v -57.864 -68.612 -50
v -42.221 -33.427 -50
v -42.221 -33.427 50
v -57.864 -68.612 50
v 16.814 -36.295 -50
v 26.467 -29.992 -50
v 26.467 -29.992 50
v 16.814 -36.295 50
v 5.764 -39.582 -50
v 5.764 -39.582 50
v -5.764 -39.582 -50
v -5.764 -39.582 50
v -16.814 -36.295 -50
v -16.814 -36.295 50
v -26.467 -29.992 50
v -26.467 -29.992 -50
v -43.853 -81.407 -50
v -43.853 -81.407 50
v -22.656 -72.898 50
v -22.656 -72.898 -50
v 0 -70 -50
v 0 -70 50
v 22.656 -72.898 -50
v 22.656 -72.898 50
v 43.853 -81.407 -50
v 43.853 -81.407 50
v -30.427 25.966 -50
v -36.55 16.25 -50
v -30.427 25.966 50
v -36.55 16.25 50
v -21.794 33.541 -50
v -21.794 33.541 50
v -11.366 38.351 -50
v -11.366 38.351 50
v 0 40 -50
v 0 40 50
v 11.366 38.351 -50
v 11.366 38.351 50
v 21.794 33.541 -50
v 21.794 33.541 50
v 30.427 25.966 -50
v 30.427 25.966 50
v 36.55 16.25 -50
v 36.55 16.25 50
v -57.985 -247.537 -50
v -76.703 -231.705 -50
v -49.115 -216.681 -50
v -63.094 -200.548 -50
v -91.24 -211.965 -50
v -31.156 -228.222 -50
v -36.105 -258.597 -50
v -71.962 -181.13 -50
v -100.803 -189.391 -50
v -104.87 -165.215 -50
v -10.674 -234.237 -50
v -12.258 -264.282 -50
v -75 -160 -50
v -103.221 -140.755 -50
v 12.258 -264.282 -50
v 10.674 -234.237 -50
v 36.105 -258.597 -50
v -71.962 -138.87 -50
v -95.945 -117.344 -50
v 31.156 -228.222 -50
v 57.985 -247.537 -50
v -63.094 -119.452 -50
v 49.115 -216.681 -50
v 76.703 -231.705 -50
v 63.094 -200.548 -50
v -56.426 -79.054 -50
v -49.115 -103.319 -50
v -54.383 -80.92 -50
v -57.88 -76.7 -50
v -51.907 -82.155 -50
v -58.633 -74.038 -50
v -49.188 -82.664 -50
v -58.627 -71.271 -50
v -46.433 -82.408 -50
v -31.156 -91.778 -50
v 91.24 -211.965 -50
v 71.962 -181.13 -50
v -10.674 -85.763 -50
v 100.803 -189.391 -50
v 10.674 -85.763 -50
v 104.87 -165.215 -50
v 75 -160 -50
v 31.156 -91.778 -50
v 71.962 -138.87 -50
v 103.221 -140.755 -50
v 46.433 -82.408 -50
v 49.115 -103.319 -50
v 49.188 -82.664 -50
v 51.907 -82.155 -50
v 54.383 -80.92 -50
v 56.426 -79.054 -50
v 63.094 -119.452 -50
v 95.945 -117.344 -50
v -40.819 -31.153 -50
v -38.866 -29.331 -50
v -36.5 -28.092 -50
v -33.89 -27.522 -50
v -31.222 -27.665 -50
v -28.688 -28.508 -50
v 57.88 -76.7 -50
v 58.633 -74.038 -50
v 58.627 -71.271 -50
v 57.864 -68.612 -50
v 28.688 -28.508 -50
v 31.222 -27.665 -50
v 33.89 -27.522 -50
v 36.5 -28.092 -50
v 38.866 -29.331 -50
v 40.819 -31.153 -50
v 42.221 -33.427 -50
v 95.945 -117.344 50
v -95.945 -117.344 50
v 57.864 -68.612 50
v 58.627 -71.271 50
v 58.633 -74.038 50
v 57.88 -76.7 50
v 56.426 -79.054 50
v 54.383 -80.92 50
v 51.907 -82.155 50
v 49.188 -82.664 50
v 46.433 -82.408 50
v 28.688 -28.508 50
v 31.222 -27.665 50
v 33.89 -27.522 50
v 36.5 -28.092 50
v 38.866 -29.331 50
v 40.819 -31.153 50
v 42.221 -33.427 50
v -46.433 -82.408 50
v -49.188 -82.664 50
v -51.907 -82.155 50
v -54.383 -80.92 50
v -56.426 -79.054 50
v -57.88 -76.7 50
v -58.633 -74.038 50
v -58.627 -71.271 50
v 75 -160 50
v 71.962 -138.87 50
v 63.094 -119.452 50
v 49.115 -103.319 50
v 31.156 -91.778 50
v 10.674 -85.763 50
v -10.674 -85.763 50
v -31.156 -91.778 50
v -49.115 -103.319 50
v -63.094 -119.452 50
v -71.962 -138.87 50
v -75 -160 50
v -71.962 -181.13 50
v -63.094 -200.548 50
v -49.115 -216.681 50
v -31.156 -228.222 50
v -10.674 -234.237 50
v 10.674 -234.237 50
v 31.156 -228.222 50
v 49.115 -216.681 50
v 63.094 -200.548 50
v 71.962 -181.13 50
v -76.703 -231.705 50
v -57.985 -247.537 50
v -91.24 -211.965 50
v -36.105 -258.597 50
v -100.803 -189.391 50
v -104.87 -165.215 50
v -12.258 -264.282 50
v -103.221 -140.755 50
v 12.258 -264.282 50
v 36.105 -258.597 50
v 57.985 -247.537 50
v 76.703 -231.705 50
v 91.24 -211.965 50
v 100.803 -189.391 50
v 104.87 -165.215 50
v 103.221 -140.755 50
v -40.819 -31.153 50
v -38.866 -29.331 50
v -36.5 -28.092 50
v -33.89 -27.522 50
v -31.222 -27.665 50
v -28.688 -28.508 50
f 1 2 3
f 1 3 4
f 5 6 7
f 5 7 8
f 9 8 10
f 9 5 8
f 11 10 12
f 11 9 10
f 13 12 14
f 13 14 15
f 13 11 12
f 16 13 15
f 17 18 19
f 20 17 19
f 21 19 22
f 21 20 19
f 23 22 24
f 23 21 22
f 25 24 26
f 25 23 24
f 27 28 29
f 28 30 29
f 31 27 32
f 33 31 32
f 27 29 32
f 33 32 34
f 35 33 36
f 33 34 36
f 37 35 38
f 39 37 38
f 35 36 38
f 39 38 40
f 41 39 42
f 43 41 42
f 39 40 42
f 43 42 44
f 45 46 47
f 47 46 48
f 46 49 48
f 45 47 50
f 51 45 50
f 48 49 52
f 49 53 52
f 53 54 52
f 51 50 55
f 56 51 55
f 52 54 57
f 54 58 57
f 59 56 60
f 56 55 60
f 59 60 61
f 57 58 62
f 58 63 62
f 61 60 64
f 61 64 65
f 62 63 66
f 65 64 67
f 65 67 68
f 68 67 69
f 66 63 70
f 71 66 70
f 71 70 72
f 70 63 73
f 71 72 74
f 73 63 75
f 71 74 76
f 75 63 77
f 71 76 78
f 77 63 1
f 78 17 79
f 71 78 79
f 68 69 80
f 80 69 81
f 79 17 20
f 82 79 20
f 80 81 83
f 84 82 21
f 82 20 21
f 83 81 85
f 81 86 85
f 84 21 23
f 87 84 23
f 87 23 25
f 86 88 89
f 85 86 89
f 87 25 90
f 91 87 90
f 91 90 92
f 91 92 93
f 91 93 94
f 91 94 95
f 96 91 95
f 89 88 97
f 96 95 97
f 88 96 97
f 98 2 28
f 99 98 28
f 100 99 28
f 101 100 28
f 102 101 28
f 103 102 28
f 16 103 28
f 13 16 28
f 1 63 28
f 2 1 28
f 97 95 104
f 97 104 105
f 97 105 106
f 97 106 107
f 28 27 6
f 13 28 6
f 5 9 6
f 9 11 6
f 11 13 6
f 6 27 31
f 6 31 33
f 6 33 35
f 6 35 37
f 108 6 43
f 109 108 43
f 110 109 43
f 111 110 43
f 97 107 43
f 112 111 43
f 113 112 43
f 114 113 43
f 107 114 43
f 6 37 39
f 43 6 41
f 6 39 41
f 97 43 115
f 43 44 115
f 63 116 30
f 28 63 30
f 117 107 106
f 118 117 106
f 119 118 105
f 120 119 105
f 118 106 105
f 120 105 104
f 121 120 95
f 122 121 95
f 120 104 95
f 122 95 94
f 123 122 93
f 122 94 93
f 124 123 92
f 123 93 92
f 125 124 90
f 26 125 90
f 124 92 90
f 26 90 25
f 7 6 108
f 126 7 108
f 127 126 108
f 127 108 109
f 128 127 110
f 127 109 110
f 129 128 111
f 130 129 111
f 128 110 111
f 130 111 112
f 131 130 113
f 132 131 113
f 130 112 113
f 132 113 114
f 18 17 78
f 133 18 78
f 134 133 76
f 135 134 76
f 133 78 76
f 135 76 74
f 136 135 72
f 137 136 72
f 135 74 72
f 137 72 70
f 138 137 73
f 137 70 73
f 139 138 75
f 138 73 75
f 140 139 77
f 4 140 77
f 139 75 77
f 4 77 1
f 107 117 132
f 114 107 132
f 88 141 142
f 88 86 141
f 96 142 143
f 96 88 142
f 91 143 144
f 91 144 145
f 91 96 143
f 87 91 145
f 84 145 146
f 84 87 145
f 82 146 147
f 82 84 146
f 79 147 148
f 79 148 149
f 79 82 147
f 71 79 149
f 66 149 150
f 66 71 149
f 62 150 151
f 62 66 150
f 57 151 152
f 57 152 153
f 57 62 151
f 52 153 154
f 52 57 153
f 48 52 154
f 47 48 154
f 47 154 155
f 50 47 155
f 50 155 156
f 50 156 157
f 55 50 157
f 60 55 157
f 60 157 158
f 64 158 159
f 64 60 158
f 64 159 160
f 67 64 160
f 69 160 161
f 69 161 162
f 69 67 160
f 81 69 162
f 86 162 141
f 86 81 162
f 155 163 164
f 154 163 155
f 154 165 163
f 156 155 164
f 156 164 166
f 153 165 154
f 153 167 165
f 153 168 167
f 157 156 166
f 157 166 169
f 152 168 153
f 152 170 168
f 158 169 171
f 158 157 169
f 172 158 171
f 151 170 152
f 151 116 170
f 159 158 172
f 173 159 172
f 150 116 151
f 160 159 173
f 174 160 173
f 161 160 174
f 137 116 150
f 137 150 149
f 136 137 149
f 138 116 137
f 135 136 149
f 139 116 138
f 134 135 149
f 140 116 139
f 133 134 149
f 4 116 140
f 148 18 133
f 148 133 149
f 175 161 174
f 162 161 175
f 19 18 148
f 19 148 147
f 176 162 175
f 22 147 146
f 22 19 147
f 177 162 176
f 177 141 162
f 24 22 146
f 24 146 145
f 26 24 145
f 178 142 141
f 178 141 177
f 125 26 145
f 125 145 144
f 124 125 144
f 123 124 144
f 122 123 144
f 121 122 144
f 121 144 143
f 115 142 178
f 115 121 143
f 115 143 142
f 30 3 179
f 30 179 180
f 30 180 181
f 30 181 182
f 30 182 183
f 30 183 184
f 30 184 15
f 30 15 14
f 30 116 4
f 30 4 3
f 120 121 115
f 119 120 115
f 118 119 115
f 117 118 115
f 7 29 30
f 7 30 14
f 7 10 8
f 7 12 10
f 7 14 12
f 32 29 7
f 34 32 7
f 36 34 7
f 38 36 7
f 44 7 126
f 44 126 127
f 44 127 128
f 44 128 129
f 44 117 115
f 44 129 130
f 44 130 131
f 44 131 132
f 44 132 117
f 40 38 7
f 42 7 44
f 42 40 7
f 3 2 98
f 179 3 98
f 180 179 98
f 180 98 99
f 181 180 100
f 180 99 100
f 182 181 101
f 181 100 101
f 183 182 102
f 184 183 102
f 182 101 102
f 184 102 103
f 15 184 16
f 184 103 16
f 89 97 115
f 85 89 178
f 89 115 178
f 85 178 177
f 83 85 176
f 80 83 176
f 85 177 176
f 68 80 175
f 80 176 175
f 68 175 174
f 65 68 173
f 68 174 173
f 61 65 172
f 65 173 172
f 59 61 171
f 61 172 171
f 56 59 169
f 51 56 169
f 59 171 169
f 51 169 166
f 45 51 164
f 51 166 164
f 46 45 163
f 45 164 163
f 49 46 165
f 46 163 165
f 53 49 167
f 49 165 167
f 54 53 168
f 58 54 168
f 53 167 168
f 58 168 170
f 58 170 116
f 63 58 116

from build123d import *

# Parameters (mm, degrees)
SKETCH1_R               = 75
BOSS_EXTRUDE1_DEPTH     = 50
CUT_EXTRUDE1_DEPTH      = 290.39592257
CUT_EXTRUDE1_DEPTH_BACK = 290.39592257
FILLET1_START           = -50
FILLET1_DEPTH           = 100


with BuildPart() as part:
    # Sketch1 → Boss-Extrude1 (new, symmetric)
    with BuildSketch(Plane.XY):
        with BuildLine():
            Line((-95.945006832, -117.34375), (-36.550478793, 16.25))
            ThreePointArc((-36.550478793, 16.25), (0, 40), (36.550478793, 16.25))
            Line((36.550478793, 16.25), (95.945006832, -117.34375))
            ThreePointArc((95.945006832, -117.34375), (0, -265), (-95.945006832, -117.34375))
        make_face()
        with Locations((0, -160)):
            Circle(SKETCH1_R, mode=Mode.SUBTRACT)
    extrude(amount=BOSS_EXTRUDE1_DEPTH, both=True)

    # Sketch2 → Cut-Extrude1 (cut, two sides: drawn at the far end of the back side and taken through both)
    with BuildSketch(Plane.XY.offset(-CUT_EXTRUDE1_DEPTH_BACK)):
        with BuildLine():
            Line((-35.52920143, -18.375958363), (-82.238577284, -123.4375))
            ThreePointArc((-82.238577284, -123.4375), (0, -70), (82.238577284, -123.4375))
            Line((82.238577284, -123.4375), (35.52920143, -18.375958363))
            ThreePointArc((35.52920143, -18.375958363), (0, -40), (-35.52920143, -18.375958363))
        make_face()
    extrude(amount=CUT_EXTRUDE1_DEPTH + CUT_EXTRUDE1_DEPTH_BACK, mode=Mode.SUBTRACT)

    # Fillet1: read off the stored shape, not the designer's step
    # Fillet1 outline → Fillet1 (add)
    with BuildSketch(Plane.XY.offset(FILLET1_START)):
        with BuildLine():
            ThreePointArc((-42.220939274, -33.427418189), (-35.213916082, -27.719526256), (-26.466655661, -29.991934551))
            ThreePointArc((-26.466655661, -29.991934551), (-31.537347698, -24.604790188), (-35.52920143, -18.375958363))
            Line((-35.52920143, -18.375958363), (-42.220939274, -33.427418189))
        make_face()
        with BuildLine():
            ThreePointArc((35.52920143, -18.375958363), (31.537347698, -24.604790188), (26.466655661, -29.991934551))
            ThreePointArc((26.466655661, -29.991934551), (35.213916082, -27.719526256), (42.220939274, -33.427418189))
            Line((42.220939274, -33.427418189), (35.52920143, -18.375958363))
        make_face()
        with BuildLine():
            ThreePointArc((-43.853361827, -81.406853629), (-55.469552548, -80.058313703), (-57.863577284, -68.61178181))
            Line((-57.863577284, -68.61178181), (-82.238577284, -123.4375))
            ThreePointArc((-82.238577284, -123.4375), (-66.45628703, -99.30764534), (-43.853361827, -81.406853629))
        make_face()
        with BuildLine():
            Line((82.238577284, -123.4375), (57.863577284, -68.61178181))
            ThreePointArc((57.863577284, -68.61178181), (55.469552548, -80.058313703), (43.853361827, -81.406853629))
            ThreePointArc((43.853361827, -81.406853629), (66.45628703, -99.30764534), (82.238577284, -123.4375))
        make_face()
    extrude(amount=FILLET1_DEPTH)


solid = part.part
